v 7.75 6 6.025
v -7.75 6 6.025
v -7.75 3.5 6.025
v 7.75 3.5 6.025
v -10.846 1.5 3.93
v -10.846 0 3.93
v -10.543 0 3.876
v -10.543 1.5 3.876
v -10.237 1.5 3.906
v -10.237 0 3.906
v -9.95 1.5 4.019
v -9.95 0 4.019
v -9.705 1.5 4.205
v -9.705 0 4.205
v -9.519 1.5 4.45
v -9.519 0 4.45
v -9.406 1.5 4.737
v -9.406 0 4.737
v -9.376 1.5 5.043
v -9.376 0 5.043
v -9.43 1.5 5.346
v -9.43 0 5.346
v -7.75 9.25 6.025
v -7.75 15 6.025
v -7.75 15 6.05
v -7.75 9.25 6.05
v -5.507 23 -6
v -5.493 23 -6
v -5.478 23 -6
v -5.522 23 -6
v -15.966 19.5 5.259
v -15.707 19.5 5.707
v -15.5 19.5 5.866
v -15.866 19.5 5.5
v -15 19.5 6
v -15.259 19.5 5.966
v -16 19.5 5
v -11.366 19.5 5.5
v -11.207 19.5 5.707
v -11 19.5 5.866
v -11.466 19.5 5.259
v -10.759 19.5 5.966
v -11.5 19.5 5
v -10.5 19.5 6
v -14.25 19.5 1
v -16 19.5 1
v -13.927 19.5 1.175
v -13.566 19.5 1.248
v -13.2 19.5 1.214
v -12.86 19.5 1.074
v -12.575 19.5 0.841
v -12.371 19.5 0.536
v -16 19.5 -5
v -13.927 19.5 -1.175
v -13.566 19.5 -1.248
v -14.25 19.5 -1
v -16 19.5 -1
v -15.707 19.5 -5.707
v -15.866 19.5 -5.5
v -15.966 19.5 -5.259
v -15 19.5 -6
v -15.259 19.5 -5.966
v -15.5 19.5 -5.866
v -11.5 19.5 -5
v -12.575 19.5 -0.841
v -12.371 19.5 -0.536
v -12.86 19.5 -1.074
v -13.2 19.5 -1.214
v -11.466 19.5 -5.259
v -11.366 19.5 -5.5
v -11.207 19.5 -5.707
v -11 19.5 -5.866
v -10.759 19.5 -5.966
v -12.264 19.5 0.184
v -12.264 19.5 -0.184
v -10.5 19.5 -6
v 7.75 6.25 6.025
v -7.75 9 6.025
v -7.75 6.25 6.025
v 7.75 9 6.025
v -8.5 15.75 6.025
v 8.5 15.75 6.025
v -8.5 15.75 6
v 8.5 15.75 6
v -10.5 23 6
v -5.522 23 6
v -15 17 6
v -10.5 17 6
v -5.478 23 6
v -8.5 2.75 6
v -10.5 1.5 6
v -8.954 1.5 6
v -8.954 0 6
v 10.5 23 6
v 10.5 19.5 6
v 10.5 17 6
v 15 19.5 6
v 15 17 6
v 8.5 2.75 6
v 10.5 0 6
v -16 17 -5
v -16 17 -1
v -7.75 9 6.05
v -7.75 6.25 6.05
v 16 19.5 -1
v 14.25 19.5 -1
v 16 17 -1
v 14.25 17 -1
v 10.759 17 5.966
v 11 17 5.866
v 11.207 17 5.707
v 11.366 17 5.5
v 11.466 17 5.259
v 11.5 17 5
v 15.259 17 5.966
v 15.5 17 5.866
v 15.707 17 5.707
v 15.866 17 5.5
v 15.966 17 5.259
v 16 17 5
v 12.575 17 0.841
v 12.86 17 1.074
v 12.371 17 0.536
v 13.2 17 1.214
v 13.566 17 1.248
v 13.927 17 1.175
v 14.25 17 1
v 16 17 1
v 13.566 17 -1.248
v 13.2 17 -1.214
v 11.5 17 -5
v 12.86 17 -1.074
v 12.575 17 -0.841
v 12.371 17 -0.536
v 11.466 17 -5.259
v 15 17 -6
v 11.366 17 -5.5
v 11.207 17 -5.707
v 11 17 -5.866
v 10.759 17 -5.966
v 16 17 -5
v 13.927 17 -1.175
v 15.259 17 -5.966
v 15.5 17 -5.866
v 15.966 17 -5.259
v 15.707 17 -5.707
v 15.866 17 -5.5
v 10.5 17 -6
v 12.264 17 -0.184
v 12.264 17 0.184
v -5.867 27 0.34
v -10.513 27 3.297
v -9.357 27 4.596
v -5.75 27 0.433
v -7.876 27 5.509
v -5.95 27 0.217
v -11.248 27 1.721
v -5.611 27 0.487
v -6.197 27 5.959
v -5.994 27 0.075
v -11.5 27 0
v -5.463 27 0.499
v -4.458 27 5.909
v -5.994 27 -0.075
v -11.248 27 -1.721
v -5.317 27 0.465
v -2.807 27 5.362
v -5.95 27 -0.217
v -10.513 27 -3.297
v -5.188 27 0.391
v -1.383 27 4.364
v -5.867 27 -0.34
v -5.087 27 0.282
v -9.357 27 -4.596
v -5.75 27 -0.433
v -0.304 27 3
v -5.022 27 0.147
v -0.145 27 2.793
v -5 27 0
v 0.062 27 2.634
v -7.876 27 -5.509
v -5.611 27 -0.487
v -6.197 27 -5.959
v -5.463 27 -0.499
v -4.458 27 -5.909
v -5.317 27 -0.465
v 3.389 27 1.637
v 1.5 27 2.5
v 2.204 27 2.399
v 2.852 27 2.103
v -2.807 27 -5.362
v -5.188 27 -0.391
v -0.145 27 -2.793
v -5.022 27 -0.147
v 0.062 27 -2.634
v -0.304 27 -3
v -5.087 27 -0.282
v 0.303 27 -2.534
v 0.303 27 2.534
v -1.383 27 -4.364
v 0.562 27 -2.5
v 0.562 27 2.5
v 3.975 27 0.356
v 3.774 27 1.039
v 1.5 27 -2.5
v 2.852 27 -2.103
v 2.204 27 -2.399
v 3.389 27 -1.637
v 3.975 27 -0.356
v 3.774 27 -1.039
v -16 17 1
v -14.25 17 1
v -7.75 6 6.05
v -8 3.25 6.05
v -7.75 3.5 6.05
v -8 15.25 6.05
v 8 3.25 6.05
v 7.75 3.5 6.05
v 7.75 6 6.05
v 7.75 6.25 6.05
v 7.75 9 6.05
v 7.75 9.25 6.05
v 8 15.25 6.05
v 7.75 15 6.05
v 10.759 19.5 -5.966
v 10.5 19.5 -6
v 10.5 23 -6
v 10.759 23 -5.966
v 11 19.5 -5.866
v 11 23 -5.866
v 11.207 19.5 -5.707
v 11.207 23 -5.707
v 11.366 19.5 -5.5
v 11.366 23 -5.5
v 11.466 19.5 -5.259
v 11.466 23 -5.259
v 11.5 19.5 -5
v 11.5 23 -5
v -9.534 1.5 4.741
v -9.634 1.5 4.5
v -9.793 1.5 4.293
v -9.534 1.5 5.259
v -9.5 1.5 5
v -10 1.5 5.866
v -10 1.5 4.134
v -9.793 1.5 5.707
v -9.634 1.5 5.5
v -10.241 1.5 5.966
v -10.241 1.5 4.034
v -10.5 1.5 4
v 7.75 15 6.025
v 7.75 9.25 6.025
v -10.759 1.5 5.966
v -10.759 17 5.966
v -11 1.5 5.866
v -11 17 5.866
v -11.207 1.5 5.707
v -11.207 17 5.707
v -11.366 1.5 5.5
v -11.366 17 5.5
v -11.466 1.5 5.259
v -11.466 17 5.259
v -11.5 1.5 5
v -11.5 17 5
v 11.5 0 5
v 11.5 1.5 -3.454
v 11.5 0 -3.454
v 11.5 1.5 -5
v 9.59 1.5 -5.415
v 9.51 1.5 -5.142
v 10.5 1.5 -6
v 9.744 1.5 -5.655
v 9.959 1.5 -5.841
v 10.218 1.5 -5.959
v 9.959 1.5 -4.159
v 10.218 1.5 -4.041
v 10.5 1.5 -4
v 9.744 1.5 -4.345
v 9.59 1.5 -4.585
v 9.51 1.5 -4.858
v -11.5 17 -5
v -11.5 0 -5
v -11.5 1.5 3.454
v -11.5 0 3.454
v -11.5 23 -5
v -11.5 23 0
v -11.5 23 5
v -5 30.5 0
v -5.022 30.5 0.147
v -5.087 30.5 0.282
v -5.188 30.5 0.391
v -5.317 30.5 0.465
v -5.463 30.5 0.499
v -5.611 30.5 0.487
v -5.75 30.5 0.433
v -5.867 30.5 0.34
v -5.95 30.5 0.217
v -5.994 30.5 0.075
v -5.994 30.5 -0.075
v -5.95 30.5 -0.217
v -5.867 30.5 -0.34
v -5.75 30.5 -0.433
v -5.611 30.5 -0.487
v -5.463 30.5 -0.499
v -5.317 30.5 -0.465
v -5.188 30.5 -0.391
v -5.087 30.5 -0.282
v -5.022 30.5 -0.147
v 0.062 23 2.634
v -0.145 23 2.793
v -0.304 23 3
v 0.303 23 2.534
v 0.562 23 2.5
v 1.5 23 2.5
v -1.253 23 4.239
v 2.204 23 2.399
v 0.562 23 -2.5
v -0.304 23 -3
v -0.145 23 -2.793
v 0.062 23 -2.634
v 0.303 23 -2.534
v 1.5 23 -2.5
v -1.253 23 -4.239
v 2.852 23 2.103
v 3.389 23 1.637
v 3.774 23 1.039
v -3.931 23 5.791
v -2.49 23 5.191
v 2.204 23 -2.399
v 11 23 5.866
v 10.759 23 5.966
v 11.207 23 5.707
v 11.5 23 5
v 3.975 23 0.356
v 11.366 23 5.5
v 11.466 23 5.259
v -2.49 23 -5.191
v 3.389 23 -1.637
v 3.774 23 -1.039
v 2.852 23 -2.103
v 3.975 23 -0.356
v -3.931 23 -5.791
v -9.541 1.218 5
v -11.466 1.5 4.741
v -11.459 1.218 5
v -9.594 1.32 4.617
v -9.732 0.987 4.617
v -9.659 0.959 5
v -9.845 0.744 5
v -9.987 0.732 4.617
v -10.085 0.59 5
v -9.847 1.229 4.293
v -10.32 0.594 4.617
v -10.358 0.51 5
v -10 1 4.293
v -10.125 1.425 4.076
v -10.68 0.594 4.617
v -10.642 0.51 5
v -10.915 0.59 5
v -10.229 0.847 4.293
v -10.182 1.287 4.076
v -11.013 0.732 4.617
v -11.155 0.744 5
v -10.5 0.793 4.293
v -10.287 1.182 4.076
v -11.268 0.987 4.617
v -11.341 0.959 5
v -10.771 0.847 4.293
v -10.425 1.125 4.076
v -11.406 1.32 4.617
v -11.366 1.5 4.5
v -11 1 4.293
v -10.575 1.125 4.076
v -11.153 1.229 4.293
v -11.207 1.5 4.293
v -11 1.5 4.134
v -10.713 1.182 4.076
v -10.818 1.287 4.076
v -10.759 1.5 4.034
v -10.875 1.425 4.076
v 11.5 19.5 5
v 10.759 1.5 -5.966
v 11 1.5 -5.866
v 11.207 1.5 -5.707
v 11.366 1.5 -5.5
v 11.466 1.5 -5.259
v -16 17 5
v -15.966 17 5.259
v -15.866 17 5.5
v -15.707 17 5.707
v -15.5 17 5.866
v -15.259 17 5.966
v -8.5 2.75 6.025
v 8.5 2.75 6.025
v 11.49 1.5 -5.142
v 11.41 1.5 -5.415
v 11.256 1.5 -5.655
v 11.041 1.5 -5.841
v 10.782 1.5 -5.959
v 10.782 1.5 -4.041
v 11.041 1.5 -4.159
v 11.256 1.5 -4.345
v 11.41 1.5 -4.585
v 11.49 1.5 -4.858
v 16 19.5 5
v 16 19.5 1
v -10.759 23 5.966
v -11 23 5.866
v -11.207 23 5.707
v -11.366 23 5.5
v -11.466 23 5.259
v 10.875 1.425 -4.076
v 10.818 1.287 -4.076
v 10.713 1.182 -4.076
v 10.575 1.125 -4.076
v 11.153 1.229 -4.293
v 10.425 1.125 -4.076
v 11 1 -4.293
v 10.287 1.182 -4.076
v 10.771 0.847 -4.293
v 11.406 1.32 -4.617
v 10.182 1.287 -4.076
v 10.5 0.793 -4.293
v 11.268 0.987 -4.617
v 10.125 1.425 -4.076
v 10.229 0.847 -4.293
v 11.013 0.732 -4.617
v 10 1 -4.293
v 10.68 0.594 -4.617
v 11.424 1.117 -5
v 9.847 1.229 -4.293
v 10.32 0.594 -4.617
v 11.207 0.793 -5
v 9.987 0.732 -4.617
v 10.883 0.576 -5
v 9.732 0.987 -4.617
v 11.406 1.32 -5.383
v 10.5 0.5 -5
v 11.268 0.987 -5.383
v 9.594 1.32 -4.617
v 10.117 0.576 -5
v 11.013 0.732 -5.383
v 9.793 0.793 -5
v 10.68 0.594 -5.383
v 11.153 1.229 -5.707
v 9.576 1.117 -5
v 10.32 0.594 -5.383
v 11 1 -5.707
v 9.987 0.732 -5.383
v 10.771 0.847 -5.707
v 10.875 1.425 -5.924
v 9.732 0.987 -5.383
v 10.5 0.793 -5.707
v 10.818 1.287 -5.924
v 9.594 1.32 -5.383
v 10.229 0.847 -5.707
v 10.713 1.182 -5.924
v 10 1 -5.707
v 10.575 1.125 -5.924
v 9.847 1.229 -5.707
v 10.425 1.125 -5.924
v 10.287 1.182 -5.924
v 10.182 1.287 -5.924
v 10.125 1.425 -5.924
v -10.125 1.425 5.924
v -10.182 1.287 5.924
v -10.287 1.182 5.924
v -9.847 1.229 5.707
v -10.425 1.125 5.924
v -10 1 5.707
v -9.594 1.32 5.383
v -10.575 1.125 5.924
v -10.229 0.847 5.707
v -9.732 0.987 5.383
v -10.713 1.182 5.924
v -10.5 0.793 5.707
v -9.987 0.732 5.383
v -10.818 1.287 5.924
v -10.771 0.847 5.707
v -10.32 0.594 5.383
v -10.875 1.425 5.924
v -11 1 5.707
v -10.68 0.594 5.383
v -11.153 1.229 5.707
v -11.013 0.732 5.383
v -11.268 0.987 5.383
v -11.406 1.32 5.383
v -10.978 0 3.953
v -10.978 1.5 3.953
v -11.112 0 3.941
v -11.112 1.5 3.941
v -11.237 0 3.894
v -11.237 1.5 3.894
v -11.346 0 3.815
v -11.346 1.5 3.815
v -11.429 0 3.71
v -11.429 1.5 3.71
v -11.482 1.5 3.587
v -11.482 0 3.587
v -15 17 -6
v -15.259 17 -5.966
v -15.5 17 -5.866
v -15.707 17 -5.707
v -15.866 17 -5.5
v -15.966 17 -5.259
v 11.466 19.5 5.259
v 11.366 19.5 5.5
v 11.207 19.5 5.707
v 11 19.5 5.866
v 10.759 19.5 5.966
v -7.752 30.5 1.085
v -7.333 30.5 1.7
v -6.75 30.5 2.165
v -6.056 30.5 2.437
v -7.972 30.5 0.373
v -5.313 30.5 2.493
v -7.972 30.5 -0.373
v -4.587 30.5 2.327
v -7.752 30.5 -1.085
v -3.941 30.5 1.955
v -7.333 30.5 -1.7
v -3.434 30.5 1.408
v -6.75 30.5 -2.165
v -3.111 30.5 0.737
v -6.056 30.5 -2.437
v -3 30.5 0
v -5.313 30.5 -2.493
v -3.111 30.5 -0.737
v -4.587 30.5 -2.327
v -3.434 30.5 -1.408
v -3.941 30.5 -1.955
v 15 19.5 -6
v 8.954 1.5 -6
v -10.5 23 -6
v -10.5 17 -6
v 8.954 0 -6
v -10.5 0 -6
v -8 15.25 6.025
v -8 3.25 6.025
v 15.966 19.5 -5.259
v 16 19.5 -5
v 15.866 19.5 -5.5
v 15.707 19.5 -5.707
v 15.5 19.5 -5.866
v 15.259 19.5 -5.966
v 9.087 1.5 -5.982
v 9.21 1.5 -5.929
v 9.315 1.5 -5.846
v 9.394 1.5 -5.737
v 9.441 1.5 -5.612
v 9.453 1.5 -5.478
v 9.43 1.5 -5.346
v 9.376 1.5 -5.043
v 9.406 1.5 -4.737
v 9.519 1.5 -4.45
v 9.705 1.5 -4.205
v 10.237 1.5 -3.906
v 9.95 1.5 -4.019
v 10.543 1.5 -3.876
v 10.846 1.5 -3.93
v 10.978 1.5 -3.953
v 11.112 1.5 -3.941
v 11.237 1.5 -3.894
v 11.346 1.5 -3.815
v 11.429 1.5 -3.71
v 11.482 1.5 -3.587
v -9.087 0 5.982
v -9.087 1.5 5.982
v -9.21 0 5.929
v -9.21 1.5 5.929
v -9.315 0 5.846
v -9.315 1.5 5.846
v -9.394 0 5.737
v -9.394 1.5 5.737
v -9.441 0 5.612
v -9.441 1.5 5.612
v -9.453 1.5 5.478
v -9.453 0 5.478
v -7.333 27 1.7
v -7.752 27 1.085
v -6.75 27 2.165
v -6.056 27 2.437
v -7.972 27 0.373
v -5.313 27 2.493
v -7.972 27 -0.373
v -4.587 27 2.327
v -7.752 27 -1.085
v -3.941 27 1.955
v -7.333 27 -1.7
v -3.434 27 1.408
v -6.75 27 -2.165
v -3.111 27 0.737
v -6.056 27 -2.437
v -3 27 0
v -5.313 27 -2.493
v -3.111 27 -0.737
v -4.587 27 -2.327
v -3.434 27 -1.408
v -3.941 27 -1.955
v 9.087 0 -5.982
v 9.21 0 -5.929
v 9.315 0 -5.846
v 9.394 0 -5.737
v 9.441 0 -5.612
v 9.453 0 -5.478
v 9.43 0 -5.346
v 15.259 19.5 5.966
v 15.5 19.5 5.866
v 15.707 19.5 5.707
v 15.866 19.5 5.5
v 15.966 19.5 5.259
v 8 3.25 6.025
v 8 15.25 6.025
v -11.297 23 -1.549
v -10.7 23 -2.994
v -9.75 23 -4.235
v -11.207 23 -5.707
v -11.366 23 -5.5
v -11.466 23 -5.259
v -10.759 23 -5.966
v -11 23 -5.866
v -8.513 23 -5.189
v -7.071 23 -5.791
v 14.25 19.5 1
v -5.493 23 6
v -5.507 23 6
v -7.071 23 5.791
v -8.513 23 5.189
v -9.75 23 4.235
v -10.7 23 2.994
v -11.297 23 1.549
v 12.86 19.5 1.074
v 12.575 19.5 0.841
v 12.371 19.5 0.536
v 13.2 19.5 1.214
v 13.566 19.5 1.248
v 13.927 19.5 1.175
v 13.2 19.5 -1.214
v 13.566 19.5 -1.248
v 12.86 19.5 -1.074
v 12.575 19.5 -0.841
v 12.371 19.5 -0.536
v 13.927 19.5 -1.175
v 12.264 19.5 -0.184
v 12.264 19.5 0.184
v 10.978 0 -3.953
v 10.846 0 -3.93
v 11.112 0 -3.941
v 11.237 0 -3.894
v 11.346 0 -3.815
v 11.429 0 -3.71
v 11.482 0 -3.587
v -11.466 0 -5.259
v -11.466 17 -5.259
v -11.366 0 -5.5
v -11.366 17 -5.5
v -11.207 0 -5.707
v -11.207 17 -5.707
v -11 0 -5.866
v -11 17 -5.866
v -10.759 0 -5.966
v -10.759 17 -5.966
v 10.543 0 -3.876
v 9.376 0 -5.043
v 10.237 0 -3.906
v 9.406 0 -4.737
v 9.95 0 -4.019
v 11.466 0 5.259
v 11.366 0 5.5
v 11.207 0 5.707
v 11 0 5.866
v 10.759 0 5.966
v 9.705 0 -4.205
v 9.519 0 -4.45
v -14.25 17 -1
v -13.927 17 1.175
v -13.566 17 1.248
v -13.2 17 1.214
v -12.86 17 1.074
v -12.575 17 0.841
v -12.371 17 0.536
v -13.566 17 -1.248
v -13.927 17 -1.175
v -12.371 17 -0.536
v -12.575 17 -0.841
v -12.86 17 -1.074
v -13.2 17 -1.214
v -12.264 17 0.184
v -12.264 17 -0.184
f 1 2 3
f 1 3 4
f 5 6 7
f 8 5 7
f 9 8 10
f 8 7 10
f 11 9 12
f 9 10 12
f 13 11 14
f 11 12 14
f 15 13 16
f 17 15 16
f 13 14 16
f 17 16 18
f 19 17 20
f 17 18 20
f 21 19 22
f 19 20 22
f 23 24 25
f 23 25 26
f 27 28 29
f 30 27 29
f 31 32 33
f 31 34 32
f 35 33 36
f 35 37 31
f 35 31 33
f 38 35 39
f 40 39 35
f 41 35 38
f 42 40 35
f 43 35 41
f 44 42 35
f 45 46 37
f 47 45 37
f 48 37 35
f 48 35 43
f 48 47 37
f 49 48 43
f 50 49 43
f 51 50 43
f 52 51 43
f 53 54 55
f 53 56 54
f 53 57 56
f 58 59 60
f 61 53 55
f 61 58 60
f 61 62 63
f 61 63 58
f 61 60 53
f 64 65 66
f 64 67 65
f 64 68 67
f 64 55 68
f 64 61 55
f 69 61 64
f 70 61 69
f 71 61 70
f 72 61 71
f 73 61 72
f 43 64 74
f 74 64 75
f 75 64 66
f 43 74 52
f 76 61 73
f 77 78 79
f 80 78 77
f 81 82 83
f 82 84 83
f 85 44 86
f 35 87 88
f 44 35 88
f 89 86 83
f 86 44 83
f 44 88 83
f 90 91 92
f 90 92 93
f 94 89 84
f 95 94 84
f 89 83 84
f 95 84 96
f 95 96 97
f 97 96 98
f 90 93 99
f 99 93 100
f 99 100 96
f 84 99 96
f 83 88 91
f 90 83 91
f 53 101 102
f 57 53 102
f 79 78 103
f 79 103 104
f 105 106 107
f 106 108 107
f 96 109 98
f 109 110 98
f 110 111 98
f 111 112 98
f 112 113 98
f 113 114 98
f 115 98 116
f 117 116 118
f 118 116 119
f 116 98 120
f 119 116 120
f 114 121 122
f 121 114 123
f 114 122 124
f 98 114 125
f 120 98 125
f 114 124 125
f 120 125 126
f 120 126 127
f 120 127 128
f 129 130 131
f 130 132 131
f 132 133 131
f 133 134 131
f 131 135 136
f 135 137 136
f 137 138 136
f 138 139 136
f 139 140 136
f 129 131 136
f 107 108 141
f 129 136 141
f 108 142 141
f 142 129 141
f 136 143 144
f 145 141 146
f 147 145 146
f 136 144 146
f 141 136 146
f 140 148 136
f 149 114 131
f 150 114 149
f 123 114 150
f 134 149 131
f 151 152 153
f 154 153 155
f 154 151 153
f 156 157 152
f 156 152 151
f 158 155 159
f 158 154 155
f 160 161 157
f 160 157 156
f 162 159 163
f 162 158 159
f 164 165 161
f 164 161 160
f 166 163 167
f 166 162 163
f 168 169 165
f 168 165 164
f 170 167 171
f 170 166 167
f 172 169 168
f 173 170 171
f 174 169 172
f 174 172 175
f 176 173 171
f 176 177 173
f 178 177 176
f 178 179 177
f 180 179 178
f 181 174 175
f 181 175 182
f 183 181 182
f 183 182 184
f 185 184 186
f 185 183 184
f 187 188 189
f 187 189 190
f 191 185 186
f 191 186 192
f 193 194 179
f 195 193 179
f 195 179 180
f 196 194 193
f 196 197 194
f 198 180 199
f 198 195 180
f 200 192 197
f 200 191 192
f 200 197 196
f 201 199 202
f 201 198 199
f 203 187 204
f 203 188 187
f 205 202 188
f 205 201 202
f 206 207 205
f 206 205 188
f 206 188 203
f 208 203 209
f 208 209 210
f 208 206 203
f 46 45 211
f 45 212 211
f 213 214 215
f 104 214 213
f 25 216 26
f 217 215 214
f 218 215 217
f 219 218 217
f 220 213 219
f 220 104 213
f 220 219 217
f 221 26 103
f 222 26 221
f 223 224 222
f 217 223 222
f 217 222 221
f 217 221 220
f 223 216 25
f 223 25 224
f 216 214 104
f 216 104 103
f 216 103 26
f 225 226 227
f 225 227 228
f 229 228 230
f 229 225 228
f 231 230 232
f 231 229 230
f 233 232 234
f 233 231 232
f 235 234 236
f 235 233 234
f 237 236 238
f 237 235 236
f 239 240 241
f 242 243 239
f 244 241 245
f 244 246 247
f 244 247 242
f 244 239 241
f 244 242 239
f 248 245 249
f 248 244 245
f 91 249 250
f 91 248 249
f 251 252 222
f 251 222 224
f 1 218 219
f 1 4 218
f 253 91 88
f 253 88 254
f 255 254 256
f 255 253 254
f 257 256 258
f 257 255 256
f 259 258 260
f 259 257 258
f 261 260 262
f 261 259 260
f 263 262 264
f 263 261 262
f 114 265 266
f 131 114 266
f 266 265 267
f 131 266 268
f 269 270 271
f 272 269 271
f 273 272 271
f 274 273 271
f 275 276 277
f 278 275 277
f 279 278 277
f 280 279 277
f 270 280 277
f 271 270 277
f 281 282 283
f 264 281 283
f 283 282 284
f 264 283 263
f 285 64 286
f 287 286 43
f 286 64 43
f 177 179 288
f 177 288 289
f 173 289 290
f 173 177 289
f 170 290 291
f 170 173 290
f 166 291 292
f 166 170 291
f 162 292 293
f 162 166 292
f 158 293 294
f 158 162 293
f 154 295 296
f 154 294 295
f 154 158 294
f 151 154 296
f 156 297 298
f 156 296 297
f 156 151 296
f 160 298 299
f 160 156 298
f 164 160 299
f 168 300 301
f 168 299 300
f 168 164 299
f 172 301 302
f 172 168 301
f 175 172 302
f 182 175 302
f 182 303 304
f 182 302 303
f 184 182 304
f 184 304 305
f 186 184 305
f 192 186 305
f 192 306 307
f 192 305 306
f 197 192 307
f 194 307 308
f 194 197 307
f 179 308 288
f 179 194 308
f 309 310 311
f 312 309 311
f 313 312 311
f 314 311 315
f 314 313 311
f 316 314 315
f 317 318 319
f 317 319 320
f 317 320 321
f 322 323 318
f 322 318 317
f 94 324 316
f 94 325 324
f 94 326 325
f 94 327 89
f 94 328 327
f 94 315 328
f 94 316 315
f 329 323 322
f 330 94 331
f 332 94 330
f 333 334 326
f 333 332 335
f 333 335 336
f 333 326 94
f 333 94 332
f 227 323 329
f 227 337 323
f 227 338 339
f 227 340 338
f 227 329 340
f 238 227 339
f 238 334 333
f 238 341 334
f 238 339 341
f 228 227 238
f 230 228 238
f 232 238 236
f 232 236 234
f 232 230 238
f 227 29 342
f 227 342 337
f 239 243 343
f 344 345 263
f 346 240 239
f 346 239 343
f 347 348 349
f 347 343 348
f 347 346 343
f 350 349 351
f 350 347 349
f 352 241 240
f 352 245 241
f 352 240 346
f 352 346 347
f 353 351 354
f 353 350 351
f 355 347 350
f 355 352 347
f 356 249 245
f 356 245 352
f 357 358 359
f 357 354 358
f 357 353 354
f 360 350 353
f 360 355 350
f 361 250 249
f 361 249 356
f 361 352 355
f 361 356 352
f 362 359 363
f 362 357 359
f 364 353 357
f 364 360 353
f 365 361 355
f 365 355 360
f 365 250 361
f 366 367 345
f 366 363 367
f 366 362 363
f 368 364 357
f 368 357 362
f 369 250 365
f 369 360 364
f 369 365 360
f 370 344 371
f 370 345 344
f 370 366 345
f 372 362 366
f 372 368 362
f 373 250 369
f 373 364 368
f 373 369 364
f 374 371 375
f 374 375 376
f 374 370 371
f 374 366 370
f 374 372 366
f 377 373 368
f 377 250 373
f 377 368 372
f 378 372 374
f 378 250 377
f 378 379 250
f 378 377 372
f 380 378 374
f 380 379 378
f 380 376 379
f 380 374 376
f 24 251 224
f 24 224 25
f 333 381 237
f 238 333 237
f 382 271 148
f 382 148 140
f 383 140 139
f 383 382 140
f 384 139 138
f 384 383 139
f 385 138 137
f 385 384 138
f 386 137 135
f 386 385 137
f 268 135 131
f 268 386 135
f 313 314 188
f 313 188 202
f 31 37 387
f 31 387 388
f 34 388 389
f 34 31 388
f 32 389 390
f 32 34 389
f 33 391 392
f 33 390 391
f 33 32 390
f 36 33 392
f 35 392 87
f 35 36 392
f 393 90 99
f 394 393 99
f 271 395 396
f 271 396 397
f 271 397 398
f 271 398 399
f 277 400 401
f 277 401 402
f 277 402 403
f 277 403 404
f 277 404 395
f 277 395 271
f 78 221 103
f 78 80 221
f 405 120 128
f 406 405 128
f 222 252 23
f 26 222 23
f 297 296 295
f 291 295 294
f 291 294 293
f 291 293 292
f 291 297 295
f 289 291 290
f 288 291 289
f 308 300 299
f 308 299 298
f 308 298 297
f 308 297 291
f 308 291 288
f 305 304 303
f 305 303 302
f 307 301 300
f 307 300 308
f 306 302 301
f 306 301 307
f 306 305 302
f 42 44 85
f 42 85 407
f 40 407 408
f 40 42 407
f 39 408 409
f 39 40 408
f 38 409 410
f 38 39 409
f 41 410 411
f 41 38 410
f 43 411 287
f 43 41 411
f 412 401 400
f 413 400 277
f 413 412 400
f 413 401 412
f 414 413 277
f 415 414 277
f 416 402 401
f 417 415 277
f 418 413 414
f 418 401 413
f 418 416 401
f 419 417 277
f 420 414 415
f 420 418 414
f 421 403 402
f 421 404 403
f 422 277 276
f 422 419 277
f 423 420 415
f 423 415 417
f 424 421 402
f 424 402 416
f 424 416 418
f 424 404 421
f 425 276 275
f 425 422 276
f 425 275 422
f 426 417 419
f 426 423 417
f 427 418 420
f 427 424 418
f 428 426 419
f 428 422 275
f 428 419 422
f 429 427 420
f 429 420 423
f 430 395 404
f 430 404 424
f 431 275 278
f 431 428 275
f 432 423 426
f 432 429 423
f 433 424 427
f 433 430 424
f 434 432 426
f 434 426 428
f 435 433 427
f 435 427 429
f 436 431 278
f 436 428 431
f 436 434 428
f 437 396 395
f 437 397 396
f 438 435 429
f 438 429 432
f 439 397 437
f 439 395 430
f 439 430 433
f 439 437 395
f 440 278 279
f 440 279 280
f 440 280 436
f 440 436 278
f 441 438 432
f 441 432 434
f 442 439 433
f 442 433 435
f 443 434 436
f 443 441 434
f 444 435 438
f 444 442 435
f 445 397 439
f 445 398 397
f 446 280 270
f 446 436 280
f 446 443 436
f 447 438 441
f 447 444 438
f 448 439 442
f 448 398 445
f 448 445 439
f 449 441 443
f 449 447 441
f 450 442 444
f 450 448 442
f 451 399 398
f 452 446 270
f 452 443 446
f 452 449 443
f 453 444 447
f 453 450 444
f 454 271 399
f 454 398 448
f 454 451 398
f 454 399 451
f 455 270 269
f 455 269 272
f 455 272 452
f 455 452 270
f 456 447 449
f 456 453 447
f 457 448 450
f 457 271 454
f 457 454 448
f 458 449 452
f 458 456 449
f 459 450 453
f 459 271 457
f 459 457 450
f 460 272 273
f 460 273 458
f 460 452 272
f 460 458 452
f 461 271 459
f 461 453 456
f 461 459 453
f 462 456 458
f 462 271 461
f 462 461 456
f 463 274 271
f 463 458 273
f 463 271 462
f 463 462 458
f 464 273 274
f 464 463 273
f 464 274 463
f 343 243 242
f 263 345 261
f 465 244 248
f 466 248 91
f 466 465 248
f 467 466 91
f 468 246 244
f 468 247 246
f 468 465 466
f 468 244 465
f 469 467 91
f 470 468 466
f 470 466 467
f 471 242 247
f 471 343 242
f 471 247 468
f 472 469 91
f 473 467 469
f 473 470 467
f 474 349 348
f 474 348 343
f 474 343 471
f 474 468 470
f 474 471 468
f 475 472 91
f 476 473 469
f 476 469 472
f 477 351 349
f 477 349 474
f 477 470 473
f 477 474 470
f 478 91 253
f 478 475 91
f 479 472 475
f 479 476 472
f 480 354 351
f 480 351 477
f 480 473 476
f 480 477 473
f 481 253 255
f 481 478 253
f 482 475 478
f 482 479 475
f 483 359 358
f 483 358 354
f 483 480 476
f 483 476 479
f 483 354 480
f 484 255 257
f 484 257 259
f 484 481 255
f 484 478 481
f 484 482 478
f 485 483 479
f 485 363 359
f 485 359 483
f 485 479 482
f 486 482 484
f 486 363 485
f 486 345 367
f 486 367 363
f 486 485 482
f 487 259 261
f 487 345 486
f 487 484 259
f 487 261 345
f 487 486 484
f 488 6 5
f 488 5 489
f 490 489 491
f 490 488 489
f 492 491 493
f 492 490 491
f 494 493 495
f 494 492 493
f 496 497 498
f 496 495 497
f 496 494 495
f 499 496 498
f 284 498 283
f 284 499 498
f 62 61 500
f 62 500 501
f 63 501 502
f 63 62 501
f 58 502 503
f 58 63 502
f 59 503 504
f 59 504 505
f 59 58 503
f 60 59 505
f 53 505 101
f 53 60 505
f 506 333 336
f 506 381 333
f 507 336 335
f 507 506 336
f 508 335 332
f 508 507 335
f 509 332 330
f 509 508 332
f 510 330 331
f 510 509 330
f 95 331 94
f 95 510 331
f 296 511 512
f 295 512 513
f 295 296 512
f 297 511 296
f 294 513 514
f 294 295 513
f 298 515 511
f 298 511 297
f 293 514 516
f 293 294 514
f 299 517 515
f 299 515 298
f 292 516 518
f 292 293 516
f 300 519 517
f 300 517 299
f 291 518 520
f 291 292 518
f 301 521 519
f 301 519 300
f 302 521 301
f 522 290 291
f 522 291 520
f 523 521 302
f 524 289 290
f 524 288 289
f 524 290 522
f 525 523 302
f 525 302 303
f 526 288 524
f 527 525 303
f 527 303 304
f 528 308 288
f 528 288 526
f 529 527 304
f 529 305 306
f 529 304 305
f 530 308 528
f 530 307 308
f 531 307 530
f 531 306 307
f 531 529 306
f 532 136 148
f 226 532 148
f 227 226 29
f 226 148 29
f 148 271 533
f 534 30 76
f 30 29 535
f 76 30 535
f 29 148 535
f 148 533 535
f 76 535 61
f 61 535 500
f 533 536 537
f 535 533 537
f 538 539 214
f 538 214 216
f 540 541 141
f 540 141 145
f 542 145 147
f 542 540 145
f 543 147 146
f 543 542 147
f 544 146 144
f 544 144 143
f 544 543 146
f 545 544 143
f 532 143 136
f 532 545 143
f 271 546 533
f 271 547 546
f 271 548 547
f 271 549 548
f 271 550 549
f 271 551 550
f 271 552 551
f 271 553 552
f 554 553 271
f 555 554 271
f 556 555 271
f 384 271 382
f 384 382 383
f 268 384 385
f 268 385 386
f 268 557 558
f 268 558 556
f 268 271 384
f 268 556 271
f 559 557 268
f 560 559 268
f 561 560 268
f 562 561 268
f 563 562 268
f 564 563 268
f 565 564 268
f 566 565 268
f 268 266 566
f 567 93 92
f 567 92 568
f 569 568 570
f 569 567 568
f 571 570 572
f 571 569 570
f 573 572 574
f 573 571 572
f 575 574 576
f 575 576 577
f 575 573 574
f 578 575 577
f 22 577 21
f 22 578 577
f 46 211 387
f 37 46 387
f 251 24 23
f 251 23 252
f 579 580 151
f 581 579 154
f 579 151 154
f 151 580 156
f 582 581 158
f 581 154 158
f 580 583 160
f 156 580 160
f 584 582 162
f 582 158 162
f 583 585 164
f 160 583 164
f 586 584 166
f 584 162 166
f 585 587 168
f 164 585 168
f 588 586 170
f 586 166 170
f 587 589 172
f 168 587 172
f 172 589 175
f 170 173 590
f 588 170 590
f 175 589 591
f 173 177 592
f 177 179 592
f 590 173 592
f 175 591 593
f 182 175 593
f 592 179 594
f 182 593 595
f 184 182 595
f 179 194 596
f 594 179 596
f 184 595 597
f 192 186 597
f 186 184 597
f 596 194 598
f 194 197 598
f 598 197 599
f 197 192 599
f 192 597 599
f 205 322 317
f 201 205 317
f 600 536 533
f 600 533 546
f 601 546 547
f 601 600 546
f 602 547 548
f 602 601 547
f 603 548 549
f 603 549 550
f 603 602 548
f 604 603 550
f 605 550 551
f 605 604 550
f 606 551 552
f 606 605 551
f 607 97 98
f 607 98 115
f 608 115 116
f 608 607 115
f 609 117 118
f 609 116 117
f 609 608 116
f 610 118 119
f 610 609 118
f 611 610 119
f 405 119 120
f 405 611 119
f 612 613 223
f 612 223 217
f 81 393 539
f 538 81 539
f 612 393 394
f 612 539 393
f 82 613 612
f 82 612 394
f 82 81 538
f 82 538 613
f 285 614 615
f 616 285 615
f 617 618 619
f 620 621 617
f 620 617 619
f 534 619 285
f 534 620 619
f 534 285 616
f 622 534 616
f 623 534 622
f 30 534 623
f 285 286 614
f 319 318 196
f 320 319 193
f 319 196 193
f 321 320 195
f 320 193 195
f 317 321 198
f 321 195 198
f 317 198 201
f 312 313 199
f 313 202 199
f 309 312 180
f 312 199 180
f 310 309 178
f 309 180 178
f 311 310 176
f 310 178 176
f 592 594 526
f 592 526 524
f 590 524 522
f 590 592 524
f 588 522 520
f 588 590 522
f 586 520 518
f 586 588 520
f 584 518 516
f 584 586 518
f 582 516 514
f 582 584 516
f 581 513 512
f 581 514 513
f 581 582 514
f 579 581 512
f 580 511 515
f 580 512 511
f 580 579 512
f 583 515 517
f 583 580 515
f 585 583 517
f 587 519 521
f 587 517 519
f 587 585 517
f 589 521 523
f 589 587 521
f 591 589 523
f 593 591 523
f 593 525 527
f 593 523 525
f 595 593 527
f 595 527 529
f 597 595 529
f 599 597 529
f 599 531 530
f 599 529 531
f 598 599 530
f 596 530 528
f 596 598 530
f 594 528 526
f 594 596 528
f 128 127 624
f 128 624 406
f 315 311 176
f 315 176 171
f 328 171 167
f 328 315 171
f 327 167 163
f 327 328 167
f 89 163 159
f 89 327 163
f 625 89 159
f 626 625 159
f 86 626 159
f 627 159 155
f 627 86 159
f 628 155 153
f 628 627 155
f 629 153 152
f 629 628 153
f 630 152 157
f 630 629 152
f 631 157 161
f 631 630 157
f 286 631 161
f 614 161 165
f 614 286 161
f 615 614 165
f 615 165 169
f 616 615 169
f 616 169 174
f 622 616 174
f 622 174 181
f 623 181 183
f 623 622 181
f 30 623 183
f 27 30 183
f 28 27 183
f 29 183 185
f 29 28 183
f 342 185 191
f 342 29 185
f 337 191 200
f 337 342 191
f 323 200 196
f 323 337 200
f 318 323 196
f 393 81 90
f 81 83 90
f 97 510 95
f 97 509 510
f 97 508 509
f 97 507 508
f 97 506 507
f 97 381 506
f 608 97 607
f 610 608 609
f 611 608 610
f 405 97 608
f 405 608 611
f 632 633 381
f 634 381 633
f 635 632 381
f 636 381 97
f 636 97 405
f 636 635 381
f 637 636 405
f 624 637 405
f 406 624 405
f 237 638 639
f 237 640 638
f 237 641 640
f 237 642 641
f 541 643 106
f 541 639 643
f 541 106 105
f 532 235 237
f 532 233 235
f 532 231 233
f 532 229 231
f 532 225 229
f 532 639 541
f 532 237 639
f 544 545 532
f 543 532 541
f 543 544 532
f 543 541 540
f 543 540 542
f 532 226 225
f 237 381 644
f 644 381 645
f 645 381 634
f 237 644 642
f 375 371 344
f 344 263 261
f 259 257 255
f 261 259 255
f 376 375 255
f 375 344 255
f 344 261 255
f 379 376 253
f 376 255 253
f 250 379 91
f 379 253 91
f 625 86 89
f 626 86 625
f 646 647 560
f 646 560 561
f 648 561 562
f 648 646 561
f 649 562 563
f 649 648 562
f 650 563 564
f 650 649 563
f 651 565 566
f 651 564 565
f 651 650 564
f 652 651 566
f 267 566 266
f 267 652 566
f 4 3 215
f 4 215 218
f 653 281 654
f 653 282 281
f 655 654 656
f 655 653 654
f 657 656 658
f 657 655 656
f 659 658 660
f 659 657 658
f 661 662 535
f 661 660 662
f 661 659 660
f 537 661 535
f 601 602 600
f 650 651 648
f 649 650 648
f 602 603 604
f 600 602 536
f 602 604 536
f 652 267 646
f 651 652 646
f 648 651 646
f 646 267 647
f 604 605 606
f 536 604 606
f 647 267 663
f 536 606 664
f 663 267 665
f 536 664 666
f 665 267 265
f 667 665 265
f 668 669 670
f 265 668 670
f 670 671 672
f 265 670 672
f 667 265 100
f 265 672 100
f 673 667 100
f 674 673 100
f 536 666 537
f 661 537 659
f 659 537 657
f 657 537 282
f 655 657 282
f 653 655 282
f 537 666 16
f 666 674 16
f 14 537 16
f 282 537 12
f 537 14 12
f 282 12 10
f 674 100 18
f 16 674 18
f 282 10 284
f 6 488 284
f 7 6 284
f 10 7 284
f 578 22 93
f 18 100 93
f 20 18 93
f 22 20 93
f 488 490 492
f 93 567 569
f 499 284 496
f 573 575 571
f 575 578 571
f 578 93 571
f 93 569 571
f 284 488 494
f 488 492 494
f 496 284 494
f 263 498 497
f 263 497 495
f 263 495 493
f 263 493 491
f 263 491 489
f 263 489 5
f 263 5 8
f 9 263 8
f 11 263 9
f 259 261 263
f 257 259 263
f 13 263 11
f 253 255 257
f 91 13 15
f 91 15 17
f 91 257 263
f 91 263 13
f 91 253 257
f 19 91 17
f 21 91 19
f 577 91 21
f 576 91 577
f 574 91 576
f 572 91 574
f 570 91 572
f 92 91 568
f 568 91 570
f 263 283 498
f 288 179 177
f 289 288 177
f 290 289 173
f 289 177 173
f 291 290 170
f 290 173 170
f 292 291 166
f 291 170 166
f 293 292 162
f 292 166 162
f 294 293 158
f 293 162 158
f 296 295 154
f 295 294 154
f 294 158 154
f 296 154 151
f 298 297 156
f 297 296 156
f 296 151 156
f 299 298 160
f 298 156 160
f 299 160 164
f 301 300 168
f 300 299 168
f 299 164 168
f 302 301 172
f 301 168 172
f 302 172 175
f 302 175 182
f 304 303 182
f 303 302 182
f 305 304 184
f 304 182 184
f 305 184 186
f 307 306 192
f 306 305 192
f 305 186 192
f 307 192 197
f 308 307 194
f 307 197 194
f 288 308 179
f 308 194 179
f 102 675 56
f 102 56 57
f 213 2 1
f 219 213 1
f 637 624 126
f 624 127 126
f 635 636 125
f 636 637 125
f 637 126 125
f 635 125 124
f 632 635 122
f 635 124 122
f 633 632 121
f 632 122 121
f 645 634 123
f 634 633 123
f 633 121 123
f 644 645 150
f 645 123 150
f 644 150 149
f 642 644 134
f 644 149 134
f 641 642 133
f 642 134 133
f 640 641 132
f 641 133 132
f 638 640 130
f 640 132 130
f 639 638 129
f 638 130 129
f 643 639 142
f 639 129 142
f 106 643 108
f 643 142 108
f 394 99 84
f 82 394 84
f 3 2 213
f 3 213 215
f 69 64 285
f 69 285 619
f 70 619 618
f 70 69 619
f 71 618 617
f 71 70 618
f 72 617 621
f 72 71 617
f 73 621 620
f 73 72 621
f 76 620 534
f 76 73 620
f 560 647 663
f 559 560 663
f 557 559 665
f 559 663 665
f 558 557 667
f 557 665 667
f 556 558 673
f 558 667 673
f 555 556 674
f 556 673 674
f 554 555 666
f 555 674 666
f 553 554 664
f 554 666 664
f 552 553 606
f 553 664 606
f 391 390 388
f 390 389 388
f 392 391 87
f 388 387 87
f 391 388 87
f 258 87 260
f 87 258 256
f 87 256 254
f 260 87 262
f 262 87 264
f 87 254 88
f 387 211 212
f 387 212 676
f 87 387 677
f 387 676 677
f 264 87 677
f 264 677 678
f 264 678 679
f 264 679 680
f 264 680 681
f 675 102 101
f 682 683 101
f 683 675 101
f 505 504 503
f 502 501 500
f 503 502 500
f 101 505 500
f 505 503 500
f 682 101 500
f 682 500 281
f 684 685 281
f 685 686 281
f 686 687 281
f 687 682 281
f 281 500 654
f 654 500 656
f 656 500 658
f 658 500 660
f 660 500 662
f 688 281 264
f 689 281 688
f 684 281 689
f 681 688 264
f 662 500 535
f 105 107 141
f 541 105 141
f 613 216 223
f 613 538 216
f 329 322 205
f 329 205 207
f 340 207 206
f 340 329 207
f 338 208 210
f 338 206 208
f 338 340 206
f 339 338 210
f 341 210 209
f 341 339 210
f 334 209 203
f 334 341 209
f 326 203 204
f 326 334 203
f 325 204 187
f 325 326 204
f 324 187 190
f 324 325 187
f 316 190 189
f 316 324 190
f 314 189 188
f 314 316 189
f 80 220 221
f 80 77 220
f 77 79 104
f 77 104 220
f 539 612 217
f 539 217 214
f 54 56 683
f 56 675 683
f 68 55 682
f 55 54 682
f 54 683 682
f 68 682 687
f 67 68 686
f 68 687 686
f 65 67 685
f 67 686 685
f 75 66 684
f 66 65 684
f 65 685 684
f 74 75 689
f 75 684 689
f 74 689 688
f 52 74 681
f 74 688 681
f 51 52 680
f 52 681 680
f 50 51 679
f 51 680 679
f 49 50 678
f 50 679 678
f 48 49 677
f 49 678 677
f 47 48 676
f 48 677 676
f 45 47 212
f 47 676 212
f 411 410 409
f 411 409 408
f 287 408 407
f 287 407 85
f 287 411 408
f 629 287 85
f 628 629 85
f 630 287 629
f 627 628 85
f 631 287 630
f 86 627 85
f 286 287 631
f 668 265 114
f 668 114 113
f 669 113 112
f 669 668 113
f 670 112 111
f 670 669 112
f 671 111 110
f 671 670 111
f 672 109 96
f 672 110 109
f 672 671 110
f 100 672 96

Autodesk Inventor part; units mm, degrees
ref_plane "YZ Plane" through (0, 0, 0) normal (1, 0, 0) x (0, 1, 0)
ref_plane "XZ Plane" through (0, 0, 0) normal (0, 1, 0) x (-1, 0, 0)
ref_plane "XY Plane" through (0, 0, 0) normal (0, 0, 1) x (1, 0, 0)
sketch "Sketch1" plane through (0, 0, 0) normal (0, 1, 0) x (-1, 0, 0)
  line L0 (10.5, 6) -> (-10.5, 6)
  line L1 (-11.5, 5) -> (-11.5, -5)
  line L2 (-10.5, -6) -> (10.5, -6)
  line L3 (11.5, -5) -> (11.5, 5)
  line L4 (11.5, 6) -> (-11.5, -6) construction
  line L5 (-11.5, 6) -> (11.5, -6) construction
  arc A0 (10.5, -6) -> (11.5, -5) centre (10.5, -5) ccw
  arc A1 (-11.5, -5) -> (-10.5, -6) centre (-10.5, -5) ccw
  arc A2 (-10.5, 6) -> (-11.5, 5) centre (-10.5, 5) ccw
  arc A3 (11.5, 5) -> (10.5, 6) centre (10.5, 5) ccw
  point P0 (0, 0)
  dimension "d0" = 23
  dimension "d1" = 12
  dimension "d2" = 1
extrude "Extrusion1" add sketch "Sketch1" along normal blind 17
sketch "Sketch2" plane through (0, 0, 0) normal (0, -1, 0) x (1, 0, 0)
  arc A0 (-10.5, 6) -> (-11.5, 5) centre (-10.5, 5) ccw projected
  arc A1 (10.5, -6) -> (11.5, -5) centre (10.5, -5) ccw projected
  circle A2 centre (-10.5, 5) radius 1.125
  circle A3 centre (10.5, -5) radius 1.125
  point P0 (0, 0)
  dimension "d5" = 2.25
  dimension "d6" = 2.25
extrude "Extrusion2" cut sketch "Sketch2" against normal blind 1.5
fillet "Fillet1" radius 0.5 4 edges at (9.9846, 0.75, -6) (11.5, 0.75, -4.4846) (-11.5, 0.75, 4.4846) (-9.9846, 0.75, 6)
sketch "Sketch3" plane through (0, 1.5, 0) normal (0, -1, 0) x (1, 0, 0)
  arc A0 (-10.5, 6) -> (-11.5, 5) centre (-10.5, 5) ccw projected
  arc A1 (-10.5, 6) -> (-10.5, 4) centre (-10.5, 5) ccw
  arc A2 (10.5, -4) -> (10.5, -6) centre (10.5, -5) ccw
  line L0 (10.5, -6) -> (10.5, -4)
  line L1 (-10.5, 4) -> (-10.5, 6)
  point P0 (0, 0)
revolve "Revolution1" add sketch "Sketch3" angle 180 about axis through (10.5, 1.5, -6) along (0, 0, 1) separate body contours L0 A2
revolve "Revolution2" add sketch "Sketch3" angle 180 about axis through (-10.5, 1.5, 4) along (0, 0, 1) separate body contours L1 A1 A0
sketch "Sketch5" plane through (0, 17, 0) normal (0, 1, 0) x (1, 0, 0)
  line L0 (16, 6) -> (-16, 6)
  line L1 (-16, -6) -> (16, -6)
  line L2 (16, -6) -> (-16, 6) construction
  line L3 (16, 6) -> (-16, -6) construction
  line L4 (10.5, 6) -> (-10.5, 6) projected
  arc A0 (-14.25, -1) -> (-14.25, 1) centre (-13.5, 0) ccw
  line L5 (-14.25, 1) -> (-16, 1)
  line L6 (-14.25, -1) -> (-16, -1)
  line L7 (-16, 6) -> (-16, 1)
  line L8 (-16, -1) -> (-16, -6)
  arc A1 (14.25, 1) -> (14.25, -1) centre (13.5, 0) ccw
  line L9 (14.25, 1) -> (16, 1)
  line L10 (14.25, -1) -> (16, -1)
  line L11 (16, -6) -> (16, -1)
  line L12 (16, 1) -> (16, 6)
  point P0 (0, 0)
  dimension "d22" = 32
extrude "Extrusion3" add sketch "Sketch5" along normal blind 2.5 bodies 1
fillet "Fillet2" radius 1 4 edges at (16, 18.25, -6) (16, 18.25, 6) (-16, 18.25, 6) (-16, 18.25, -6)
sketch "Sketch6" plane through (0, 19.5, 0) normal (0, 1, 0) x (1, 0, 0)
  line L0 (-11.5, 5) -> (-11.5, -5) projected
  arc A0 (-11.5, -5) -> (-10.5, -6) centre (-10.5, -5) ccw projected
  arc A1 (-10.5, 6) -> (-11.5, 5) centre (-10.5, 5) ccw projected
  line L1 (11.5, -5) -> (11.5, 5) projected
  arc A2 (11.5, 5) -> (10.5, 6) centre (10.5, 5) ccw projected
  arc A3 (10.5, -6) -> (11.5, -5) centre (10.5, -5) ccw projected
  line L2 (-10.5, 6) -> (10.5, 6)
  line L3 (-10.5, -6) -> (-8.9538, -6) projected
  line L4 (-10.5, -6) -> (10.5, -6)
  point P0 (0, 0)
extrude "Extrusion4" add sketch "Sketch6" along normal blind 3.5 bodies 1
sketch "Sketch7" plane through (0, 23, 0) normal (0, 1, 0) x (1, 0, 0)
  line L0 (-11.5, 5) -> (-11.5, -5) projected
  line L1 (-11.5, -3.4538) -> (-11.5, 5) projected
  line L2 (0, 0) -> (1.5, 0)
  arc A0 (1.5, -2.5) -> (1.5, 2.5) centre (1.5, 0) ccw
  line L3 (1.5, 2.5) -> (-0.0456, 2.5)
  line L4 (1.5, -2.5) -> (-0.0456, -2.5)
  arc A1 (-0.0456, 2.5) -> (-0.0456, -2.5) centre (-5.5, 0) ccw
extrude "Extrusion5" add sketch "Sketch7" along normal blind 4 bodies 1
fillet "Fillet3" radius 1 2 edges at (-0.0456, 25, 2.5) (-0.0456, 25, -2.5)
sketch "Sketch8" plane through (0, 27, 0) normal (0, 1, 0) x (1, 0, 0)
  arc A0 (-0.3038, 3) -> (-0.3038, -3) centre (-5.5, 0) ccw projected
  circle A1 centre (-5.5, 0) radius 0.5
  point P0 (0, 0)
  dimension "d38" = 1
extrude "Extrusion6" add sketch "Sketch8" along normal blind 3.5 bodies 1
sketch "Sketch9" plane through (0, 27, 0) normal (0, 1, 0) x (1, 0, 0)
  circle A0 centre (-5.5, 0) radius 0.5 projected
  circle A1 centre (-5.5, 0) radius 2.5
  point P0 (0, 0)
extrude "Extrusion7" add sketch "Sketch9" along normal blind 3.5 separate body
sketch "Sketch10" plane through (-8.9538, 0, 6) normal (0, 0, 1) x (1, 0, 0)
  line L0 (-1.5462, 1.5) -> (-1.5462, 17)
  line L1 (0.4538, 2.75) -> (17.4538, 2.75)
  line L2 (17.4538, 2.75) -> (17.4538, 15.75)
  line L3 (17.4538, 15.75) -> (0.4538, 15.75)
  line L4 (0.4538, 15.75) -> (0.4538, 2.75)
  line L5 (0.4538, 2.75) -> (17.4538, 15.75) construction
  line L6 (17.4538, 2.75) -> (0.4538, 15.75) construction
  point P0 (8.9538, 0)
  dimension "d44" = 17
  dimension "d45" = 13
extrude "Extrusion8" add sketch "Sketch10" along normal blind 0.025 bodies 1
sketch "Sketch11" plane through (-8.9538, 0, 6.025) normal (0, 0, 1) x (1, 0, 0)
  line L0 (0.4538, 2.75) -> (17.4538, 2.75) projected
  line L1 (17.4538, 2.75) -> (17.4538, 15.75) projected
  line L2 (17.4538, 15.75) -> (0.4538, 15.75) projected
  line L3 (0.4538, 15.75) -> (0.4538, 2.75) projected
  line L4 (0.9538, 15.25) -> (16.9538, 15.25)
  line L5 (16.9538, 15.25) -> (16.9538, 3.25)
  line L6 (16.9538, 3.25) -> (0.9538, 3.25)
  line L7 (0.9538, 3.25) -> (0.9538, 15.25)
  line L8 (16.7038, 15) -> (1.2038, 15)
  line L9 (1.2038, 3.5) -> (16.7038, 3.5)
  line L10 (16.7038, 9.25) -> (1.2038, 9.25)
  line L11 (16.7038, 9) -> (1.2038, 9)
  line L12 (1.2038, 6.25) -> (16.7038, 6.25)
  line L13 (1.2038, 6) -> (16.7038, 6)
  line L14 (1.2038, 15) -> (1.2038, 9.25)
  line L15 (1.2038, 9) -> (1.2038, 6.25)
  line L16 (1.2038, 6) -> (1.2038, 3.5)
  line L17 (1.2038, 9) -> (1.2038, 6.25)
  line L18 (1.2038, 6) -> (1.2038, 3.5)
  line L19 (16.7038, 3.5) -> (16.7038, 6)
  line L20 (16.7038, 6.25) -> (16.7038, 9)
  line L21 (16.7038, 9.25) -> (16.7038, 15)
  point P0 (8.9538, 0)
  dimension "d48" = 0.5
  dimension "d49" = 0.25
  dimension "d50" = 0.25
  dimension "d51" = 0.25
extrude "Extrusion9" add sketch "Sketch11" along normal blind 0.025 contours L4 L5 L6 L7 bodies 1
sketch "Sketch12" plane through (-8.9538, 0, 6.025) normal (0, 0, 1) x (1, 0, 0)
  line L0 (5.8302, 8.978) -> (21.2508, 8.978) construction
  line L1 (21.2508, 8.978) -> (21.2508, 6.2497) construction
  line L2 (21.2508, 6.2497) -> (5.8302, 6.2497) construction
  line L3 (5.8302, 6.2497) -> (5.8302, 8.978) construction
  point P0 (8.9538, 0)
sketch "Sketch13" plane through (-8.9538, 0, 6.025) normal (0, 0, 1) x (1, 0, 0)
  line L0 (5.268, 5.8598) -> (20.7463, 5.8598) construction
  line L1 (20.7463, 5.8598) -> (20.7463, 3.3385) construction
  line L2 (20.7463, 3.3385) -> (5.268, 3.3385) construction
  line L3 (5.268, 3.3385) -> (5.268, 5.8598) construction
  point P0 (8.9538, 0)
properties part number "Part1_sG90"
